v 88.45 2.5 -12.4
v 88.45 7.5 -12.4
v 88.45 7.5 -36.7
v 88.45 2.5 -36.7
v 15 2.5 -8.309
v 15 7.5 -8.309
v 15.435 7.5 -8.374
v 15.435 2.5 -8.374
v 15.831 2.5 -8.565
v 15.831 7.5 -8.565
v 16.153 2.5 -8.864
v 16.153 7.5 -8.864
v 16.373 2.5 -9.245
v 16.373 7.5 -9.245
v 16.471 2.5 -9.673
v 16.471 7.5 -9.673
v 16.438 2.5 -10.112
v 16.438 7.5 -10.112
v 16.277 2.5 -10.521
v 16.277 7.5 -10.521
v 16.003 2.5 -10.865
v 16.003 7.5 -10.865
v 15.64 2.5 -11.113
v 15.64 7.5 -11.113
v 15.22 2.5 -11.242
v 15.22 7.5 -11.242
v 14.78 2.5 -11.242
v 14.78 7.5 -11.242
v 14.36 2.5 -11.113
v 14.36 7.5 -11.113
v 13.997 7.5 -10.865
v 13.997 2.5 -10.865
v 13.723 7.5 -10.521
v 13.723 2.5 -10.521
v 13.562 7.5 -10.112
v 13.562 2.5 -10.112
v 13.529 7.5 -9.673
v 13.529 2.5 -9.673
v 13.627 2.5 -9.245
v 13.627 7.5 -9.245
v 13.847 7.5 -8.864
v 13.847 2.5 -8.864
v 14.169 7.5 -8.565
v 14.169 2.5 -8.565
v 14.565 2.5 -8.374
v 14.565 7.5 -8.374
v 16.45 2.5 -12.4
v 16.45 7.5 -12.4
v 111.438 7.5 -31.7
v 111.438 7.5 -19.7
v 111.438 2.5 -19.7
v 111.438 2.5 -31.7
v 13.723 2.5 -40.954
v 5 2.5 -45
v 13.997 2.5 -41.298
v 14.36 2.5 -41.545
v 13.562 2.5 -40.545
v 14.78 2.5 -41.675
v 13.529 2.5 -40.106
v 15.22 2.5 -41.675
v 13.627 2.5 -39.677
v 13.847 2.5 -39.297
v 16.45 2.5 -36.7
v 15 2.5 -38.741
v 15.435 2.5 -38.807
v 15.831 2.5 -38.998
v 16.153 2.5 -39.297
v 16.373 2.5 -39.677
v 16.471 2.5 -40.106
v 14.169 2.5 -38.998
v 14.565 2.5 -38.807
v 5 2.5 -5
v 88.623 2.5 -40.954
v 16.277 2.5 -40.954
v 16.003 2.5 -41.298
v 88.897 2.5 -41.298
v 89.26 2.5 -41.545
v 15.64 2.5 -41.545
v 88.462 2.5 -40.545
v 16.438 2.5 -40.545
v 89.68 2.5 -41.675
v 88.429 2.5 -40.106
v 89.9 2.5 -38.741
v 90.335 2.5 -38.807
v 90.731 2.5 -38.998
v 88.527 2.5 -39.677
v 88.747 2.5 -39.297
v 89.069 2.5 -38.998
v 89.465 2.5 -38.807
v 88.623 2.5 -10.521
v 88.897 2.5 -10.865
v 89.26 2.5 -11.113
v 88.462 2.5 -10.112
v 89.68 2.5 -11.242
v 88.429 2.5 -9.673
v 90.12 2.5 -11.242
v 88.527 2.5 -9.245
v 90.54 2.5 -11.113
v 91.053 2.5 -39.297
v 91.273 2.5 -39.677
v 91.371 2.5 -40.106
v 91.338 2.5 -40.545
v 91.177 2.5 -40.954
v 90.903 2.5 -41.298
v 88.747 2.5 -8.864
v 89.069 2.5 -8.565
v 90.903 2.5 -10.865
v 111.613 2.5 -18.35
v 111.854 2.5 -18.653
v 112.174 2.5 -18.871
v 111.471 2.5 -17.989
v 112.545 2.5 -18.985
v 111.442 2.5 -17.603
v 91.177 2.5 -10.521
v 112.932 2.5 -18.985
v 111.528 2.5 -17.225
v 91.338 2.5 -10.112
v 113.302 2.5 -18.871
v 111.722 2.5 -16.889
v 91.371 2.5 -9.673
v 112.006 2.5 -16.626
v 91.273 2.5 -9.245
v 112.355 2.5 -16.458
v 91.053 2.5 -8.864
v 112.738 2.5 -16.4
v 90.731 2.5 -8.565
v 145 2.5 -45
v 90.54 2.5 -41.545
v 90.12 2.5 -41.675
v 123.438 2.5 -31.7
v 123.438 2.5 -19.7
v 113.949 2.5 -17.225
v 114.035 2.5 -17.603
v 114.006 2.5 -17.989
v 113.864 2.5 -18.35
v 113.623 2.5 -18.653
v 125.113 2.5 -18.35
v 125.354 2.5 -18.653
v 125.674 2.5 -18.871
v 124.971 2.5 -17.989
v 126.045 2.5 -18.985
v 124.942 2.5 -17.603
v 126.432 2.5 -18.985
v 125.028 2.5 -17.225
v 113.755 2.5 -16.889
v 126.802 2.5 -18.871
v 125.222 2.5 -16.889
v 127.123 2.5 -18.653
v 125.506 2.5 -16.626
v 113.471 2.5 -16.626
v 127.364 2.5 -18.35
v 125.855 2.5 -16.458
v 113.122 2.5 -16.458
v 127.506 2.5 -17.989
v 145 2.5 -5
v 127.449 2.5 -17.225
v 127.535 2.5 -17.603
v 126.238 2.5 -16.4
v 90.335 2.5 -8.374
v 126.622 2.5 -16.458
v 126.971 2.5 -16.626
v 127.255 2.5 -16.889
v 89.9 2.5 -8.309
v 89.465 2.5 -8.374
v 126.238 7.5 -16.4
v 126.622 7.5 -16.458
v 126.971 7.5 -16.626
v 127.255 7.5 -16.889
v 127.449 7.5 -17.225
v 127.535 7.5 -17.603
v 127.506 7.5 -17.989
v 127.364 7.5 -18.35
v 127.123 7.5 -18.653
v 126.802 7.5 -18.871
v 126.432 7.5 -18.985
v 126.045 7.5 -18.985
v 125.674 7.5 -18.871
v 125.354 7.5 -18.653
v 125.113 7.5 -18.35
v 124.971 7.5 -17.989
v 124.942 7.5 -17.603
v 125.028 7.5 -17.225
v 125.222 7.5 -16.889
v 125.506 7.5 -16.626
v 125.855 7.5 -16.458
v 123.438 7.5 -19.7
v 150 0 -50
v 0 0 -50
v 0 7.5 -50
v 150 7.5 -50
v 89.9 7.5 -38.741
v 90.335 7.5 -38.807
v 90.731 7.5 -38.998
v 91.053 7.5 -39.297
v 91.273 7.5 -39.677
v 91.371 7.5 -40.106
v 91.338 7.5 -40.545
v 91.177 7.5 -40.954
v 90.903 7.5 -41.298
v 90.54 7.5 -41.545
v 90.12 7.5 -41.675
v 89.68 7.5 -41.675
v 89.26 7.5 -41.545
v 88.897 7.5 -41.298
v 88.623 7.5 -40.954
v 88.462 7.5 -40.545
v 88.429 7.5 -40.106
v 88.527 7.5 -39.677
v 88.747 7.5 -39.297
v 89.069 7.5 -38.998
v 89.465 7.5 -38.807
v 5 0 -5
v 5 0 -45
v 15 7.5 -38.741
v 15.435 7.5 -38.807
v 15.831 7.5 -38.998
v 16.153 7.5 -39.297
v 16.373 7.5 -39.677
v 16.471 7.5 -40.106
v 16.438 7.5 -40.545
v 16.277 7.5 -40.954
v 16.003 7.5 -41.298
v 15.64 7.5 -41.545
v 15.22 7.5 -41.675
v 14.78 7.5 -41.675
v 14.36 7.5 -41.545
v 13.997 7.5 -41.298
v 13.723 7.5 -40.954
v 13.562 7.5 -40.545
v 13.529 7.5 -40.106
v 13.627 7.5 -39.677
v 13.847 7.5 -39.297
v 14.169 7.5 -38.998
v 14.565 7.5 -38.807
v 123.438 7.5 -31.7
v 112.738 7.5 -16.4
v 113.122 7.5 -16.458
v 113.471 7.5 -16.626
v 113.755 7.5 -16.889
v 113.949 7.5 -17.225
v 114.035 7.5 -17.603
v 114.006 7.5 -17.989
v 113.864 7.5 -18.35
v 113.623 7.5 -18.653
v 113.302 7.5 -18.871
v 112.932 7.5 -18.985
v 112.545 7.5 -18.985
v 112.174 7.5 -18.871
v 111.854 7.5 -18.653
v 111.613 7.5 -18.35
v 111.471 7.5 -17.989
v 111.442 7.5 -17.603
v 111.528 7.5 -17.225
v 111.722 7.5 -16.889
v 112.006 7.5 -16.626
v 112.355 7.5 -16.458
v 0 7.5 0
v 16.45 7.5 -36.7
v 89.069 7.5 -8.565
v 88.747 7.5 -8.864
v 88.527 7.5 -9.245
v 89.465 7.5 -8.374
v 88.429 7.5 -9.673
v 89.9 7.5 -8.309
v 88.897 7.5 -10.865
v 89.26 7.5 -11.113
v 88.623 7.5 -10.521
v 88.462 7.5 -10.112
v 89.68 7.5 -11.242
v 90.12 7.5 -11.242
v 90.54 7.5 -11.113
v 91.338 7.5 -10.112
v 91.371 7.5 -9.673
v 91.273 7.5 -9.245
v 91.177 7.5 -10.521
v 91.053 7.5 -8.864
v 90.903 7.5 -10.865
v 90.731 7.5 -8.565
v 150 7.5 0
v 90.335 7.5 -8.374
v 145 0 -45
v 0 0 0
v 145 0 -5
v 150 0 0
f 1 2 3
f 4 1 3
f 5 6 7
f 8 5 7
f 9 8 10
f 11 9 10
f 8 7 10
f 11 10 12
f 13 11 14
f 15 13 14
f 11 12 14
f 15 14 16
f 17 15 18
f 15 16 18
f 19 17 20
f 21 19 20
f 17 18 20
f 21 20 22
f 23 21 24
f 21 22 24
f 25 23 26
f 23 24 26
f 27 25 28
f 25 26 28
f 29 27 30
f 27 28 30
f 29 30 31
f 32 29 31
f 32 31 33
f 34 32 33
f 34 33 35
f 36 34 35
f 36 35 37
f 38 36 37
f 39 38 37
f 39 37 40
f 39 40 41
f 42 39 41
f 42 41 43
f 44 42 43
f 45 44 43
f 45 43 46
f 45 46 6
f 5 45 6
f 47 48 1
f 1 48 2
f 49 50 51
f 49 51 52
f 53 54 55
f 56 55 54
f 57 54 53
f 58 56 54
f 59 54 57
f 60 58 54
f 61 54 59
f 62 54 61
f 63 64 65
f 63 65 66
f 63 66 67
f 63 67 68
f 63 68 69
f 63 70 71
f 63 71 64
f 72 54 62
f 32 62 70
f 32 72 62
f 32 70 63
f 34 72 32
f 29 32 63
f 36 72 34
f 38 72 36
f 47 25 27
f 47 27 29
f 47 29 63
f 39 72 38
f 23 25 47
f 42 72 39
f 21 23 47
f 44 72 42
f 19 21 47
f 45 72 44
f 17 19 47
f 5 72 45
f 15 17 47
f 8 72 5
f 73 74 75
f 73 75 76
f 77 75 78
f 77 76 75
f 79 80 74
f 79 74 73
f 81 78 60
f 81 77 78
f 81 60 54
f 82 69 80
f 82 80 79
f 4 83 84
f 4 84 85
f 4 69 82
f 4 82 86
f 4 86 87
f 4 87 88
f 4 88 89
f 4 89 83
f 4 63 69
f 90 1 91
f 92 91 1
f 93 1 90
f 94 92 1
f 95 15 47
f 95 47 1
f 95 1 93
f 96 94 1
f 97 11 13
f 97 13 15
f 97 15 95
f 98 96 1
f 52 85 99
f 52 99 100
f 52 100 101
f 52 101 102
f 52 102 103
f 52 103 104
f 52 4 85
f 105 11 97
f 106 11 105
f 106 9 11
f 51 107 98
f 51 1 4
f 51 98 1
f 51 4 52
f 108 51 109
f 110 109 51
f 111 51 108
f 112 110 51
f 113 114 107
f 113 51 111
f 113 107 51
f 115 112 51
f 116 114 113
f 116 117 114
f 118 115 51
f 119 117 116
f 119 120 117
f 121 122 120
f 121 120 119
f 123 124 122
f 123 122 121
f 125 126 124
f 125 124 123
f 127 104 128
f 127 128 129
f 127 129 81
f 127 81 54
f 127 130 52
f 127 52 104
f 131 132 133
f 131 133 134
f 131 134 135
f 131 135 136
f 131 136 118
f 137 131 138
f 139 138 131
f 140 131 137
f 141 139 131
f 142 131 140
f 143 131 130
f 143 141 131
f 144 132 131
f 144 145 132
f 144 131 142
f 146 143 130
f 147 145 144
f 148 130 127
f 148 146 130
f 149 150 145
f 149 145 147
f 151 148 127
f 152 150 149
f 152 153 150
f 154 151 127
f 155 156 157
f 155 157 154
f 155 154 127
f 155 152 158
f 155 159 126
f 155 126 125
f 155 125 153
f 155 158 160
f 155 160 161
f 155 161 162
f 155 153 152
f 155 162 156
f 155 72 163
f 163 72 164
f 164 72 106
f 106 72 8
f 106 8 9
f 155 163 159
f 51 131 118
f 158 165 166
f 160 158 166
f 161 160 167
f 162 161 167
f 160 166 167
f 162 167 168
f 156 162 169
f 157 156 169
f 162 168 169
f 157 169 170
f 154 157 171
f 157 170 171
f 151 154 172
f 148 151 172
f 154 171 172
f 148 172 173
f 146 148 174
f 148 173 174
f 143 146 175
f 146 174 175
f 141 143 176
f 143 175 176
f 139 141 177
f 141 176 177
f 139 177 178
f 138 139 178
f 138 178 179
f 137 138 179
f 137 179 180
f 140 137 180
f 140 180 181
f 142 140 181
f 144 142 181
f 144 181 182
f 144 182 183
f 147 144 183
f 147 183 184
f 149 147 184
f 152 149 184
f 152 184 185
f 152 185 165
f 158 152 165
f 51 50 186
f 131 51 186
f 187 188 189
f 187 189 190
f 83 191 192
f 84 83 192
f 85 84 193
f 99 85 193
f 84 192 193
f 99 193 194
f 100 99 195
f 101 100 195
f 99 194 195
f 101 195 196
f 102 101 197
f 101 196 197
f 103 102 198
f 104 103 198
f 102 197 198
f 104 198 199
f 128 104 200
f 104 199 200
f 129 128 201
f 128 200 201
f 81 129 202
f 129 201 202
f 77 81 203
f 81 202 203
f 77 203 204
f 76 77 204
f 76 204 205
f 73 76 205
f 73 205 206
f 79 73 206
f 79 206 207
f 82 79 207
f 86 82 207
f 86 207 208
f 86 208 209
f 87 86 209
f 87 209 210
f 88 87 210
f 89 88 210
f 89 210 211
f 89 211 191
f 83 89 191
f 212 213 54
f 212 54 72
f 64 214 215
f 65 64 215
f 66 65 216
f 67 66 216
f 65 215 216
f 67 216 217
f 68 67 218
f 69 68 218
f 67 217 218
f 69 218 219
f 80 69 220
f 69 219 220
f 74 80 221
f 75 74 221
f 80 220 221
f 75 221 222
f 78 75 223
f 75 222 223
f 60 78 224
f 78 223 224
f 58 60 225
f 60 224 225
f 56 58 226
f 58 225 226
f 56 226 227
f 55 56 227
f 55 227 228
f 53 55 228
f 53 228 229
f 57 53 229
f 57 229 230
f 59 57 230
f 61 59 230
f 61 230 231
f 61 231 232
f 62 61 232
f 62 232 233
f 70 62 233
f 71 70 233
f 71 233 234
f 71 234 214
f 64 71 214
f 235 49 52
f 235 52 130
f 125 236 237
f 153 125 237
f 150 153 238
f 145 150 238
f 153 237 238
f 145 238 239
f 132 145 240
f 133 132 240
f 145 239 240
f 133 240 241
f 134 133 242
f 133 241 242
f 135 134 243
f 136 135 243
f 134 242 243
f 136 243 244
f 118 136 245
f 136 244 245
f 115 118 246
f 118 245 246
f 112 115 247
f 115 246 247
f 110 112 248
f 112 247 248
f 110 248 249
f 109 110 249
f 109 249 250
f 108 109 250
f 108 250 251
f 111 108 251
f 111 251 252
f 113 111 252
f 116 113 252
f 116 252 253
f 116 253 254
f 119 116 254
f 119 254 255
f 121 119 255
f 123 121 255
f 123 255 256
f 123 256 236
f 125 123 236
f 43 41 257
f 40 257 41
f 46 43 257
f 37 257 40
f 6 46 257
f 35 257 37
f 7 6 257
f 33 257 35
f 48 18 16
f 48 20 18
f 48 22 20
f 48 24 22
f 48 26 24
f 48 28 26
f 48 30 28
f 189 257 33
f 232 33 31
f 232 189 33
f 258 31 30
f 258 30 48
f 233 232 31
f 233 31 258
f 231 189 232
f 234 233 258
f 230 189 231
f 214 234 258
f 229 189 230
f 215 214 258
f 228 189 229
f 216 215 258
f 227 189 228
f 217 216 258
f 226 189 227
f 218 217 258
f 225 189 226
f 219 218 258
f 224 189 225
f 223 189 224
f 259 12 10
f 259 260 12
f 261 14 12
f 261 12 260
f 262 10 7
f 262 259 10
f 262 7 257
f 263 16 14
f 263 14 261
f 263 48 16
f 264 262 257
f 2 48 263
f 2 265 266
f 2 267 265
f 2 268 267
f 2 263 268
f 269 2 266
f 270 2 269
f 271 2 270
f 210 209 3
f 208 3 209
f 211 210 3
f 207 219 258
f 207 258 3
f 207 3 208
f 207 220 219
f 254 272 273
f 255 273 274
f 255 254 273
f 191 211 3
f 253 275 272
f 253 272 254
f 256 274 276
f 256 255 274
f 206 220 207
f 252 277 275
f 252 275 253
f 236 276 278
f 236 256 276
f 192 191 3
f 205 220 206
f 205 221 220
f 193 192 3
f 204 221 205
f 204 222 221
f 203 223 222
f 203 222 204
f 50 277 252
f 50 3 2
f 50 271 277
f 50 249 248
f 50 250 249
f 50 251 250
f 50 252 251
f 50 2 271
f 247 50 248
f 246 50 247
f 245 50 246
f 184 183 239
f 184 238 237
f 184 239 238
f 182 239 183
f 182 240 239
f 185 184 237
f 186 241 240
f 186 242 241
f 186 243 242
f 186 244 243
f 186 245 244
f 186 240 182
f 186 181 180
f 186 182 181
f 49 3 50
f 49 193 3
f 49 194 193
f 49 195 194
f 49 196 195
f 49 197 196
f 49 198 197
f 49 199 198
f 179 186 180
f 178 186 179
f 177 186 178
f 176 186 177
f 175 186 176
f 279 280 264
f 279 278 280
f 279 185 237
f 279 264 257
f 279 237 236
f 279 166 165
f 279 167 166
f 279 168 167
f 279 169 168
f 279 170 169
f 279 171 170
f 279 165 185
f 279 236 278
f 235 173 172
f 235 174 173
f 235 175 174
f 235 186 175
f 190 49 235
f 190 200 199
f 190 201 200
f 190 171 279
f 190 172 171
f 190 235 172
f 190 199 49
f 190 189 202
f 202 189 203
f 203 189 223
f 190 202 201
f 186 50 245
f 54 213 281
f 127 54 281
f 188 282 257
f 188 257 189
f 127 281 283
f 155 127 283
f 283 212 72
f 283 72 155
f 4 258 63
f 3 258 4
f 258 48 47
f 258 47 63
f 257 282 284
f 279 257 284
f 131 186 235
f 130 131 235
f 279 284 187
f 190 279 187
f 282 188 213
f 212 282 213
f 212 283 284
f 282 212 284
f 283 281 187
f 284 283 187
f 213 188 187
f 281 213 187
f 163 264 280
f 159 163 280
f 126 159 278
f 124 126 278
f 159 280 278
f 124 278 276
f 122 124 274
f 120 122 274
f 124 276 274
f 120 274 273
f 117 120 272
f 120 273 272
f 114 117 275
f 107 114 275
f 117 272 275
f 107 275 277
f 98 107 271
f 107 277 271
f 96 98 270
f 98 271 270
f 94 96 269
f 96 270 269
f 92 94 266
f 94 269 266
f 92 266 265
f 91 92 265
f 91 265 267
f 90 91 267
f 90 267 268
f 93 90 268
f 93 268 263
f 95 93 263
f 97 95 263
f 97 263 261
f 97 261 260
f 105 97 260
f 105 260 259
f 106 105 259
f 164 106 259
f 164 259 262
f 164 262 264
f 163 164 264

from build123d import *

# Parameters (mm, degrees)
SKETCH2_W           = 150
SKETCH2_H           = 50
BOSS_EXTRUDE1_DEPTH = 7.5
SKETCH3_R           = 1.475
CUT_EXTRUDE1_DEPTH  = 159.291661183
SKETCH4_R           = 1.3
CUT_EXTRUDE2_DEPTH  = 159.291661183
SKETCH6_W           = 140
SKETCH6_H           = 40
CUT_EXTRUDE3_DEPTH  = 2.5
SKETCH8_W           = 72
SKETCH8_H           = 24.3
CUT_EXTRUDE4_DEPTH  = 159.291661183
SKETCH9_W           = 12
SKETCH9_H           = 12
CUT_EXTRUDE5_DEPTH  = 159.291661183


with BuildPart() as part:
    # Sketch2 → Boss-Extrude1 (new body)
    with BuildSketch(Plane(origin=(0, 0, 0), x_dir=(1, 0, 0), z_dir=(0, 1, 0))):
        with Locations((75, 25)):
            Rectangle(SKETCH2_W, SKETCH2_H)
    extrude(amount=BOSS_EXTRUDE1_DEPTH)

    # Sketch3 → Cut-Extrude1 (cut, through all)
    with BuildSketch(Plane(origin=(0, 7.5, 0), x_dir=(1, 0, 0), z_dir=(0, 1, 0))):
        with Locations(Location((15, 40.216322293, 0), (0, 0, 270))):
            Circle(SKETCH3_R)
        with Locations(Location((89.9, 40.216322293, 0), (0, 0, 270))):
            Circle(SKETCH3_R)
        with Locations(Location((89.9, 9.783677707, 0), (0, 0, 270))):
            Circle(SKETCH3_R)
        with Locations(Location((15, 9.783677707, 0), (0, 0, 270))):
            Circle(SKETCH3_R)
    extrude(amount=-CUT_EXTRUDE1_DEPTH, mode=Mode.SUBTRACT)

    # Sketch4 → Cut-Extrude2 (cut, through all)
    with BuildSketch(Plane(origin=(0, 7.5, 0), x_dir=(1, 0, 0), z_dir=(0, 1, 0))):
        with Locations(Location((112.738384592, 17.7, 0), (0, 0, 270))):
            Circle(SKETCH4_R)
        with Locations(Location((126.238384592, 17.7, 0), (0, 0, 270))):
            Circle(SKETCH4_R)
    extrude(amount=-CUT_EXTRUDE2_DEPTH, mode=Mode.SUBTRACT)

    # Sketch6 → Cut-Extrude3 (cut)
    with BuildSketch(Plane.XZ):
        with Locations((75, -25)):
            Rectangle(SKETCH6_W, SKETCH6_H)
    extrude(amount=-CUT_EXTRUDE3_DEPTH, mode=Mode.SUBTRACT)

    # Sketch8 → Cut-Extrude4 (cut, through all)
    with BuildSketch(Plane(origin=(0, 7.5, 0), x_dir=(1, 0, 0), z_dir=(0, 1, 0))):
        with Locations((52.45, 24.55)):
            Rectangle(SKETCH8_W, SKETCH8_H)
    extrude(amount=-CUT_EXTRUDE4_DEPTH, mode=Mode.SUBTRACT)

    # Sketch9 → Cut-Extrude5 (cut, through all)
    with BuildSketch(Plane(origin=(0, 7.5, 0), x_dir=(1, 0, 0), z_dir=(0, 1, 0))):
        with Locations((117.438384592, 25.7)):
            Rectangle(SKETCH9_W, SKETCH9_H)
    extrude(amount=-CUT_EXTRUDE5_DEPTH, mode=Mode.SUBTRACT)


solid = part.part
